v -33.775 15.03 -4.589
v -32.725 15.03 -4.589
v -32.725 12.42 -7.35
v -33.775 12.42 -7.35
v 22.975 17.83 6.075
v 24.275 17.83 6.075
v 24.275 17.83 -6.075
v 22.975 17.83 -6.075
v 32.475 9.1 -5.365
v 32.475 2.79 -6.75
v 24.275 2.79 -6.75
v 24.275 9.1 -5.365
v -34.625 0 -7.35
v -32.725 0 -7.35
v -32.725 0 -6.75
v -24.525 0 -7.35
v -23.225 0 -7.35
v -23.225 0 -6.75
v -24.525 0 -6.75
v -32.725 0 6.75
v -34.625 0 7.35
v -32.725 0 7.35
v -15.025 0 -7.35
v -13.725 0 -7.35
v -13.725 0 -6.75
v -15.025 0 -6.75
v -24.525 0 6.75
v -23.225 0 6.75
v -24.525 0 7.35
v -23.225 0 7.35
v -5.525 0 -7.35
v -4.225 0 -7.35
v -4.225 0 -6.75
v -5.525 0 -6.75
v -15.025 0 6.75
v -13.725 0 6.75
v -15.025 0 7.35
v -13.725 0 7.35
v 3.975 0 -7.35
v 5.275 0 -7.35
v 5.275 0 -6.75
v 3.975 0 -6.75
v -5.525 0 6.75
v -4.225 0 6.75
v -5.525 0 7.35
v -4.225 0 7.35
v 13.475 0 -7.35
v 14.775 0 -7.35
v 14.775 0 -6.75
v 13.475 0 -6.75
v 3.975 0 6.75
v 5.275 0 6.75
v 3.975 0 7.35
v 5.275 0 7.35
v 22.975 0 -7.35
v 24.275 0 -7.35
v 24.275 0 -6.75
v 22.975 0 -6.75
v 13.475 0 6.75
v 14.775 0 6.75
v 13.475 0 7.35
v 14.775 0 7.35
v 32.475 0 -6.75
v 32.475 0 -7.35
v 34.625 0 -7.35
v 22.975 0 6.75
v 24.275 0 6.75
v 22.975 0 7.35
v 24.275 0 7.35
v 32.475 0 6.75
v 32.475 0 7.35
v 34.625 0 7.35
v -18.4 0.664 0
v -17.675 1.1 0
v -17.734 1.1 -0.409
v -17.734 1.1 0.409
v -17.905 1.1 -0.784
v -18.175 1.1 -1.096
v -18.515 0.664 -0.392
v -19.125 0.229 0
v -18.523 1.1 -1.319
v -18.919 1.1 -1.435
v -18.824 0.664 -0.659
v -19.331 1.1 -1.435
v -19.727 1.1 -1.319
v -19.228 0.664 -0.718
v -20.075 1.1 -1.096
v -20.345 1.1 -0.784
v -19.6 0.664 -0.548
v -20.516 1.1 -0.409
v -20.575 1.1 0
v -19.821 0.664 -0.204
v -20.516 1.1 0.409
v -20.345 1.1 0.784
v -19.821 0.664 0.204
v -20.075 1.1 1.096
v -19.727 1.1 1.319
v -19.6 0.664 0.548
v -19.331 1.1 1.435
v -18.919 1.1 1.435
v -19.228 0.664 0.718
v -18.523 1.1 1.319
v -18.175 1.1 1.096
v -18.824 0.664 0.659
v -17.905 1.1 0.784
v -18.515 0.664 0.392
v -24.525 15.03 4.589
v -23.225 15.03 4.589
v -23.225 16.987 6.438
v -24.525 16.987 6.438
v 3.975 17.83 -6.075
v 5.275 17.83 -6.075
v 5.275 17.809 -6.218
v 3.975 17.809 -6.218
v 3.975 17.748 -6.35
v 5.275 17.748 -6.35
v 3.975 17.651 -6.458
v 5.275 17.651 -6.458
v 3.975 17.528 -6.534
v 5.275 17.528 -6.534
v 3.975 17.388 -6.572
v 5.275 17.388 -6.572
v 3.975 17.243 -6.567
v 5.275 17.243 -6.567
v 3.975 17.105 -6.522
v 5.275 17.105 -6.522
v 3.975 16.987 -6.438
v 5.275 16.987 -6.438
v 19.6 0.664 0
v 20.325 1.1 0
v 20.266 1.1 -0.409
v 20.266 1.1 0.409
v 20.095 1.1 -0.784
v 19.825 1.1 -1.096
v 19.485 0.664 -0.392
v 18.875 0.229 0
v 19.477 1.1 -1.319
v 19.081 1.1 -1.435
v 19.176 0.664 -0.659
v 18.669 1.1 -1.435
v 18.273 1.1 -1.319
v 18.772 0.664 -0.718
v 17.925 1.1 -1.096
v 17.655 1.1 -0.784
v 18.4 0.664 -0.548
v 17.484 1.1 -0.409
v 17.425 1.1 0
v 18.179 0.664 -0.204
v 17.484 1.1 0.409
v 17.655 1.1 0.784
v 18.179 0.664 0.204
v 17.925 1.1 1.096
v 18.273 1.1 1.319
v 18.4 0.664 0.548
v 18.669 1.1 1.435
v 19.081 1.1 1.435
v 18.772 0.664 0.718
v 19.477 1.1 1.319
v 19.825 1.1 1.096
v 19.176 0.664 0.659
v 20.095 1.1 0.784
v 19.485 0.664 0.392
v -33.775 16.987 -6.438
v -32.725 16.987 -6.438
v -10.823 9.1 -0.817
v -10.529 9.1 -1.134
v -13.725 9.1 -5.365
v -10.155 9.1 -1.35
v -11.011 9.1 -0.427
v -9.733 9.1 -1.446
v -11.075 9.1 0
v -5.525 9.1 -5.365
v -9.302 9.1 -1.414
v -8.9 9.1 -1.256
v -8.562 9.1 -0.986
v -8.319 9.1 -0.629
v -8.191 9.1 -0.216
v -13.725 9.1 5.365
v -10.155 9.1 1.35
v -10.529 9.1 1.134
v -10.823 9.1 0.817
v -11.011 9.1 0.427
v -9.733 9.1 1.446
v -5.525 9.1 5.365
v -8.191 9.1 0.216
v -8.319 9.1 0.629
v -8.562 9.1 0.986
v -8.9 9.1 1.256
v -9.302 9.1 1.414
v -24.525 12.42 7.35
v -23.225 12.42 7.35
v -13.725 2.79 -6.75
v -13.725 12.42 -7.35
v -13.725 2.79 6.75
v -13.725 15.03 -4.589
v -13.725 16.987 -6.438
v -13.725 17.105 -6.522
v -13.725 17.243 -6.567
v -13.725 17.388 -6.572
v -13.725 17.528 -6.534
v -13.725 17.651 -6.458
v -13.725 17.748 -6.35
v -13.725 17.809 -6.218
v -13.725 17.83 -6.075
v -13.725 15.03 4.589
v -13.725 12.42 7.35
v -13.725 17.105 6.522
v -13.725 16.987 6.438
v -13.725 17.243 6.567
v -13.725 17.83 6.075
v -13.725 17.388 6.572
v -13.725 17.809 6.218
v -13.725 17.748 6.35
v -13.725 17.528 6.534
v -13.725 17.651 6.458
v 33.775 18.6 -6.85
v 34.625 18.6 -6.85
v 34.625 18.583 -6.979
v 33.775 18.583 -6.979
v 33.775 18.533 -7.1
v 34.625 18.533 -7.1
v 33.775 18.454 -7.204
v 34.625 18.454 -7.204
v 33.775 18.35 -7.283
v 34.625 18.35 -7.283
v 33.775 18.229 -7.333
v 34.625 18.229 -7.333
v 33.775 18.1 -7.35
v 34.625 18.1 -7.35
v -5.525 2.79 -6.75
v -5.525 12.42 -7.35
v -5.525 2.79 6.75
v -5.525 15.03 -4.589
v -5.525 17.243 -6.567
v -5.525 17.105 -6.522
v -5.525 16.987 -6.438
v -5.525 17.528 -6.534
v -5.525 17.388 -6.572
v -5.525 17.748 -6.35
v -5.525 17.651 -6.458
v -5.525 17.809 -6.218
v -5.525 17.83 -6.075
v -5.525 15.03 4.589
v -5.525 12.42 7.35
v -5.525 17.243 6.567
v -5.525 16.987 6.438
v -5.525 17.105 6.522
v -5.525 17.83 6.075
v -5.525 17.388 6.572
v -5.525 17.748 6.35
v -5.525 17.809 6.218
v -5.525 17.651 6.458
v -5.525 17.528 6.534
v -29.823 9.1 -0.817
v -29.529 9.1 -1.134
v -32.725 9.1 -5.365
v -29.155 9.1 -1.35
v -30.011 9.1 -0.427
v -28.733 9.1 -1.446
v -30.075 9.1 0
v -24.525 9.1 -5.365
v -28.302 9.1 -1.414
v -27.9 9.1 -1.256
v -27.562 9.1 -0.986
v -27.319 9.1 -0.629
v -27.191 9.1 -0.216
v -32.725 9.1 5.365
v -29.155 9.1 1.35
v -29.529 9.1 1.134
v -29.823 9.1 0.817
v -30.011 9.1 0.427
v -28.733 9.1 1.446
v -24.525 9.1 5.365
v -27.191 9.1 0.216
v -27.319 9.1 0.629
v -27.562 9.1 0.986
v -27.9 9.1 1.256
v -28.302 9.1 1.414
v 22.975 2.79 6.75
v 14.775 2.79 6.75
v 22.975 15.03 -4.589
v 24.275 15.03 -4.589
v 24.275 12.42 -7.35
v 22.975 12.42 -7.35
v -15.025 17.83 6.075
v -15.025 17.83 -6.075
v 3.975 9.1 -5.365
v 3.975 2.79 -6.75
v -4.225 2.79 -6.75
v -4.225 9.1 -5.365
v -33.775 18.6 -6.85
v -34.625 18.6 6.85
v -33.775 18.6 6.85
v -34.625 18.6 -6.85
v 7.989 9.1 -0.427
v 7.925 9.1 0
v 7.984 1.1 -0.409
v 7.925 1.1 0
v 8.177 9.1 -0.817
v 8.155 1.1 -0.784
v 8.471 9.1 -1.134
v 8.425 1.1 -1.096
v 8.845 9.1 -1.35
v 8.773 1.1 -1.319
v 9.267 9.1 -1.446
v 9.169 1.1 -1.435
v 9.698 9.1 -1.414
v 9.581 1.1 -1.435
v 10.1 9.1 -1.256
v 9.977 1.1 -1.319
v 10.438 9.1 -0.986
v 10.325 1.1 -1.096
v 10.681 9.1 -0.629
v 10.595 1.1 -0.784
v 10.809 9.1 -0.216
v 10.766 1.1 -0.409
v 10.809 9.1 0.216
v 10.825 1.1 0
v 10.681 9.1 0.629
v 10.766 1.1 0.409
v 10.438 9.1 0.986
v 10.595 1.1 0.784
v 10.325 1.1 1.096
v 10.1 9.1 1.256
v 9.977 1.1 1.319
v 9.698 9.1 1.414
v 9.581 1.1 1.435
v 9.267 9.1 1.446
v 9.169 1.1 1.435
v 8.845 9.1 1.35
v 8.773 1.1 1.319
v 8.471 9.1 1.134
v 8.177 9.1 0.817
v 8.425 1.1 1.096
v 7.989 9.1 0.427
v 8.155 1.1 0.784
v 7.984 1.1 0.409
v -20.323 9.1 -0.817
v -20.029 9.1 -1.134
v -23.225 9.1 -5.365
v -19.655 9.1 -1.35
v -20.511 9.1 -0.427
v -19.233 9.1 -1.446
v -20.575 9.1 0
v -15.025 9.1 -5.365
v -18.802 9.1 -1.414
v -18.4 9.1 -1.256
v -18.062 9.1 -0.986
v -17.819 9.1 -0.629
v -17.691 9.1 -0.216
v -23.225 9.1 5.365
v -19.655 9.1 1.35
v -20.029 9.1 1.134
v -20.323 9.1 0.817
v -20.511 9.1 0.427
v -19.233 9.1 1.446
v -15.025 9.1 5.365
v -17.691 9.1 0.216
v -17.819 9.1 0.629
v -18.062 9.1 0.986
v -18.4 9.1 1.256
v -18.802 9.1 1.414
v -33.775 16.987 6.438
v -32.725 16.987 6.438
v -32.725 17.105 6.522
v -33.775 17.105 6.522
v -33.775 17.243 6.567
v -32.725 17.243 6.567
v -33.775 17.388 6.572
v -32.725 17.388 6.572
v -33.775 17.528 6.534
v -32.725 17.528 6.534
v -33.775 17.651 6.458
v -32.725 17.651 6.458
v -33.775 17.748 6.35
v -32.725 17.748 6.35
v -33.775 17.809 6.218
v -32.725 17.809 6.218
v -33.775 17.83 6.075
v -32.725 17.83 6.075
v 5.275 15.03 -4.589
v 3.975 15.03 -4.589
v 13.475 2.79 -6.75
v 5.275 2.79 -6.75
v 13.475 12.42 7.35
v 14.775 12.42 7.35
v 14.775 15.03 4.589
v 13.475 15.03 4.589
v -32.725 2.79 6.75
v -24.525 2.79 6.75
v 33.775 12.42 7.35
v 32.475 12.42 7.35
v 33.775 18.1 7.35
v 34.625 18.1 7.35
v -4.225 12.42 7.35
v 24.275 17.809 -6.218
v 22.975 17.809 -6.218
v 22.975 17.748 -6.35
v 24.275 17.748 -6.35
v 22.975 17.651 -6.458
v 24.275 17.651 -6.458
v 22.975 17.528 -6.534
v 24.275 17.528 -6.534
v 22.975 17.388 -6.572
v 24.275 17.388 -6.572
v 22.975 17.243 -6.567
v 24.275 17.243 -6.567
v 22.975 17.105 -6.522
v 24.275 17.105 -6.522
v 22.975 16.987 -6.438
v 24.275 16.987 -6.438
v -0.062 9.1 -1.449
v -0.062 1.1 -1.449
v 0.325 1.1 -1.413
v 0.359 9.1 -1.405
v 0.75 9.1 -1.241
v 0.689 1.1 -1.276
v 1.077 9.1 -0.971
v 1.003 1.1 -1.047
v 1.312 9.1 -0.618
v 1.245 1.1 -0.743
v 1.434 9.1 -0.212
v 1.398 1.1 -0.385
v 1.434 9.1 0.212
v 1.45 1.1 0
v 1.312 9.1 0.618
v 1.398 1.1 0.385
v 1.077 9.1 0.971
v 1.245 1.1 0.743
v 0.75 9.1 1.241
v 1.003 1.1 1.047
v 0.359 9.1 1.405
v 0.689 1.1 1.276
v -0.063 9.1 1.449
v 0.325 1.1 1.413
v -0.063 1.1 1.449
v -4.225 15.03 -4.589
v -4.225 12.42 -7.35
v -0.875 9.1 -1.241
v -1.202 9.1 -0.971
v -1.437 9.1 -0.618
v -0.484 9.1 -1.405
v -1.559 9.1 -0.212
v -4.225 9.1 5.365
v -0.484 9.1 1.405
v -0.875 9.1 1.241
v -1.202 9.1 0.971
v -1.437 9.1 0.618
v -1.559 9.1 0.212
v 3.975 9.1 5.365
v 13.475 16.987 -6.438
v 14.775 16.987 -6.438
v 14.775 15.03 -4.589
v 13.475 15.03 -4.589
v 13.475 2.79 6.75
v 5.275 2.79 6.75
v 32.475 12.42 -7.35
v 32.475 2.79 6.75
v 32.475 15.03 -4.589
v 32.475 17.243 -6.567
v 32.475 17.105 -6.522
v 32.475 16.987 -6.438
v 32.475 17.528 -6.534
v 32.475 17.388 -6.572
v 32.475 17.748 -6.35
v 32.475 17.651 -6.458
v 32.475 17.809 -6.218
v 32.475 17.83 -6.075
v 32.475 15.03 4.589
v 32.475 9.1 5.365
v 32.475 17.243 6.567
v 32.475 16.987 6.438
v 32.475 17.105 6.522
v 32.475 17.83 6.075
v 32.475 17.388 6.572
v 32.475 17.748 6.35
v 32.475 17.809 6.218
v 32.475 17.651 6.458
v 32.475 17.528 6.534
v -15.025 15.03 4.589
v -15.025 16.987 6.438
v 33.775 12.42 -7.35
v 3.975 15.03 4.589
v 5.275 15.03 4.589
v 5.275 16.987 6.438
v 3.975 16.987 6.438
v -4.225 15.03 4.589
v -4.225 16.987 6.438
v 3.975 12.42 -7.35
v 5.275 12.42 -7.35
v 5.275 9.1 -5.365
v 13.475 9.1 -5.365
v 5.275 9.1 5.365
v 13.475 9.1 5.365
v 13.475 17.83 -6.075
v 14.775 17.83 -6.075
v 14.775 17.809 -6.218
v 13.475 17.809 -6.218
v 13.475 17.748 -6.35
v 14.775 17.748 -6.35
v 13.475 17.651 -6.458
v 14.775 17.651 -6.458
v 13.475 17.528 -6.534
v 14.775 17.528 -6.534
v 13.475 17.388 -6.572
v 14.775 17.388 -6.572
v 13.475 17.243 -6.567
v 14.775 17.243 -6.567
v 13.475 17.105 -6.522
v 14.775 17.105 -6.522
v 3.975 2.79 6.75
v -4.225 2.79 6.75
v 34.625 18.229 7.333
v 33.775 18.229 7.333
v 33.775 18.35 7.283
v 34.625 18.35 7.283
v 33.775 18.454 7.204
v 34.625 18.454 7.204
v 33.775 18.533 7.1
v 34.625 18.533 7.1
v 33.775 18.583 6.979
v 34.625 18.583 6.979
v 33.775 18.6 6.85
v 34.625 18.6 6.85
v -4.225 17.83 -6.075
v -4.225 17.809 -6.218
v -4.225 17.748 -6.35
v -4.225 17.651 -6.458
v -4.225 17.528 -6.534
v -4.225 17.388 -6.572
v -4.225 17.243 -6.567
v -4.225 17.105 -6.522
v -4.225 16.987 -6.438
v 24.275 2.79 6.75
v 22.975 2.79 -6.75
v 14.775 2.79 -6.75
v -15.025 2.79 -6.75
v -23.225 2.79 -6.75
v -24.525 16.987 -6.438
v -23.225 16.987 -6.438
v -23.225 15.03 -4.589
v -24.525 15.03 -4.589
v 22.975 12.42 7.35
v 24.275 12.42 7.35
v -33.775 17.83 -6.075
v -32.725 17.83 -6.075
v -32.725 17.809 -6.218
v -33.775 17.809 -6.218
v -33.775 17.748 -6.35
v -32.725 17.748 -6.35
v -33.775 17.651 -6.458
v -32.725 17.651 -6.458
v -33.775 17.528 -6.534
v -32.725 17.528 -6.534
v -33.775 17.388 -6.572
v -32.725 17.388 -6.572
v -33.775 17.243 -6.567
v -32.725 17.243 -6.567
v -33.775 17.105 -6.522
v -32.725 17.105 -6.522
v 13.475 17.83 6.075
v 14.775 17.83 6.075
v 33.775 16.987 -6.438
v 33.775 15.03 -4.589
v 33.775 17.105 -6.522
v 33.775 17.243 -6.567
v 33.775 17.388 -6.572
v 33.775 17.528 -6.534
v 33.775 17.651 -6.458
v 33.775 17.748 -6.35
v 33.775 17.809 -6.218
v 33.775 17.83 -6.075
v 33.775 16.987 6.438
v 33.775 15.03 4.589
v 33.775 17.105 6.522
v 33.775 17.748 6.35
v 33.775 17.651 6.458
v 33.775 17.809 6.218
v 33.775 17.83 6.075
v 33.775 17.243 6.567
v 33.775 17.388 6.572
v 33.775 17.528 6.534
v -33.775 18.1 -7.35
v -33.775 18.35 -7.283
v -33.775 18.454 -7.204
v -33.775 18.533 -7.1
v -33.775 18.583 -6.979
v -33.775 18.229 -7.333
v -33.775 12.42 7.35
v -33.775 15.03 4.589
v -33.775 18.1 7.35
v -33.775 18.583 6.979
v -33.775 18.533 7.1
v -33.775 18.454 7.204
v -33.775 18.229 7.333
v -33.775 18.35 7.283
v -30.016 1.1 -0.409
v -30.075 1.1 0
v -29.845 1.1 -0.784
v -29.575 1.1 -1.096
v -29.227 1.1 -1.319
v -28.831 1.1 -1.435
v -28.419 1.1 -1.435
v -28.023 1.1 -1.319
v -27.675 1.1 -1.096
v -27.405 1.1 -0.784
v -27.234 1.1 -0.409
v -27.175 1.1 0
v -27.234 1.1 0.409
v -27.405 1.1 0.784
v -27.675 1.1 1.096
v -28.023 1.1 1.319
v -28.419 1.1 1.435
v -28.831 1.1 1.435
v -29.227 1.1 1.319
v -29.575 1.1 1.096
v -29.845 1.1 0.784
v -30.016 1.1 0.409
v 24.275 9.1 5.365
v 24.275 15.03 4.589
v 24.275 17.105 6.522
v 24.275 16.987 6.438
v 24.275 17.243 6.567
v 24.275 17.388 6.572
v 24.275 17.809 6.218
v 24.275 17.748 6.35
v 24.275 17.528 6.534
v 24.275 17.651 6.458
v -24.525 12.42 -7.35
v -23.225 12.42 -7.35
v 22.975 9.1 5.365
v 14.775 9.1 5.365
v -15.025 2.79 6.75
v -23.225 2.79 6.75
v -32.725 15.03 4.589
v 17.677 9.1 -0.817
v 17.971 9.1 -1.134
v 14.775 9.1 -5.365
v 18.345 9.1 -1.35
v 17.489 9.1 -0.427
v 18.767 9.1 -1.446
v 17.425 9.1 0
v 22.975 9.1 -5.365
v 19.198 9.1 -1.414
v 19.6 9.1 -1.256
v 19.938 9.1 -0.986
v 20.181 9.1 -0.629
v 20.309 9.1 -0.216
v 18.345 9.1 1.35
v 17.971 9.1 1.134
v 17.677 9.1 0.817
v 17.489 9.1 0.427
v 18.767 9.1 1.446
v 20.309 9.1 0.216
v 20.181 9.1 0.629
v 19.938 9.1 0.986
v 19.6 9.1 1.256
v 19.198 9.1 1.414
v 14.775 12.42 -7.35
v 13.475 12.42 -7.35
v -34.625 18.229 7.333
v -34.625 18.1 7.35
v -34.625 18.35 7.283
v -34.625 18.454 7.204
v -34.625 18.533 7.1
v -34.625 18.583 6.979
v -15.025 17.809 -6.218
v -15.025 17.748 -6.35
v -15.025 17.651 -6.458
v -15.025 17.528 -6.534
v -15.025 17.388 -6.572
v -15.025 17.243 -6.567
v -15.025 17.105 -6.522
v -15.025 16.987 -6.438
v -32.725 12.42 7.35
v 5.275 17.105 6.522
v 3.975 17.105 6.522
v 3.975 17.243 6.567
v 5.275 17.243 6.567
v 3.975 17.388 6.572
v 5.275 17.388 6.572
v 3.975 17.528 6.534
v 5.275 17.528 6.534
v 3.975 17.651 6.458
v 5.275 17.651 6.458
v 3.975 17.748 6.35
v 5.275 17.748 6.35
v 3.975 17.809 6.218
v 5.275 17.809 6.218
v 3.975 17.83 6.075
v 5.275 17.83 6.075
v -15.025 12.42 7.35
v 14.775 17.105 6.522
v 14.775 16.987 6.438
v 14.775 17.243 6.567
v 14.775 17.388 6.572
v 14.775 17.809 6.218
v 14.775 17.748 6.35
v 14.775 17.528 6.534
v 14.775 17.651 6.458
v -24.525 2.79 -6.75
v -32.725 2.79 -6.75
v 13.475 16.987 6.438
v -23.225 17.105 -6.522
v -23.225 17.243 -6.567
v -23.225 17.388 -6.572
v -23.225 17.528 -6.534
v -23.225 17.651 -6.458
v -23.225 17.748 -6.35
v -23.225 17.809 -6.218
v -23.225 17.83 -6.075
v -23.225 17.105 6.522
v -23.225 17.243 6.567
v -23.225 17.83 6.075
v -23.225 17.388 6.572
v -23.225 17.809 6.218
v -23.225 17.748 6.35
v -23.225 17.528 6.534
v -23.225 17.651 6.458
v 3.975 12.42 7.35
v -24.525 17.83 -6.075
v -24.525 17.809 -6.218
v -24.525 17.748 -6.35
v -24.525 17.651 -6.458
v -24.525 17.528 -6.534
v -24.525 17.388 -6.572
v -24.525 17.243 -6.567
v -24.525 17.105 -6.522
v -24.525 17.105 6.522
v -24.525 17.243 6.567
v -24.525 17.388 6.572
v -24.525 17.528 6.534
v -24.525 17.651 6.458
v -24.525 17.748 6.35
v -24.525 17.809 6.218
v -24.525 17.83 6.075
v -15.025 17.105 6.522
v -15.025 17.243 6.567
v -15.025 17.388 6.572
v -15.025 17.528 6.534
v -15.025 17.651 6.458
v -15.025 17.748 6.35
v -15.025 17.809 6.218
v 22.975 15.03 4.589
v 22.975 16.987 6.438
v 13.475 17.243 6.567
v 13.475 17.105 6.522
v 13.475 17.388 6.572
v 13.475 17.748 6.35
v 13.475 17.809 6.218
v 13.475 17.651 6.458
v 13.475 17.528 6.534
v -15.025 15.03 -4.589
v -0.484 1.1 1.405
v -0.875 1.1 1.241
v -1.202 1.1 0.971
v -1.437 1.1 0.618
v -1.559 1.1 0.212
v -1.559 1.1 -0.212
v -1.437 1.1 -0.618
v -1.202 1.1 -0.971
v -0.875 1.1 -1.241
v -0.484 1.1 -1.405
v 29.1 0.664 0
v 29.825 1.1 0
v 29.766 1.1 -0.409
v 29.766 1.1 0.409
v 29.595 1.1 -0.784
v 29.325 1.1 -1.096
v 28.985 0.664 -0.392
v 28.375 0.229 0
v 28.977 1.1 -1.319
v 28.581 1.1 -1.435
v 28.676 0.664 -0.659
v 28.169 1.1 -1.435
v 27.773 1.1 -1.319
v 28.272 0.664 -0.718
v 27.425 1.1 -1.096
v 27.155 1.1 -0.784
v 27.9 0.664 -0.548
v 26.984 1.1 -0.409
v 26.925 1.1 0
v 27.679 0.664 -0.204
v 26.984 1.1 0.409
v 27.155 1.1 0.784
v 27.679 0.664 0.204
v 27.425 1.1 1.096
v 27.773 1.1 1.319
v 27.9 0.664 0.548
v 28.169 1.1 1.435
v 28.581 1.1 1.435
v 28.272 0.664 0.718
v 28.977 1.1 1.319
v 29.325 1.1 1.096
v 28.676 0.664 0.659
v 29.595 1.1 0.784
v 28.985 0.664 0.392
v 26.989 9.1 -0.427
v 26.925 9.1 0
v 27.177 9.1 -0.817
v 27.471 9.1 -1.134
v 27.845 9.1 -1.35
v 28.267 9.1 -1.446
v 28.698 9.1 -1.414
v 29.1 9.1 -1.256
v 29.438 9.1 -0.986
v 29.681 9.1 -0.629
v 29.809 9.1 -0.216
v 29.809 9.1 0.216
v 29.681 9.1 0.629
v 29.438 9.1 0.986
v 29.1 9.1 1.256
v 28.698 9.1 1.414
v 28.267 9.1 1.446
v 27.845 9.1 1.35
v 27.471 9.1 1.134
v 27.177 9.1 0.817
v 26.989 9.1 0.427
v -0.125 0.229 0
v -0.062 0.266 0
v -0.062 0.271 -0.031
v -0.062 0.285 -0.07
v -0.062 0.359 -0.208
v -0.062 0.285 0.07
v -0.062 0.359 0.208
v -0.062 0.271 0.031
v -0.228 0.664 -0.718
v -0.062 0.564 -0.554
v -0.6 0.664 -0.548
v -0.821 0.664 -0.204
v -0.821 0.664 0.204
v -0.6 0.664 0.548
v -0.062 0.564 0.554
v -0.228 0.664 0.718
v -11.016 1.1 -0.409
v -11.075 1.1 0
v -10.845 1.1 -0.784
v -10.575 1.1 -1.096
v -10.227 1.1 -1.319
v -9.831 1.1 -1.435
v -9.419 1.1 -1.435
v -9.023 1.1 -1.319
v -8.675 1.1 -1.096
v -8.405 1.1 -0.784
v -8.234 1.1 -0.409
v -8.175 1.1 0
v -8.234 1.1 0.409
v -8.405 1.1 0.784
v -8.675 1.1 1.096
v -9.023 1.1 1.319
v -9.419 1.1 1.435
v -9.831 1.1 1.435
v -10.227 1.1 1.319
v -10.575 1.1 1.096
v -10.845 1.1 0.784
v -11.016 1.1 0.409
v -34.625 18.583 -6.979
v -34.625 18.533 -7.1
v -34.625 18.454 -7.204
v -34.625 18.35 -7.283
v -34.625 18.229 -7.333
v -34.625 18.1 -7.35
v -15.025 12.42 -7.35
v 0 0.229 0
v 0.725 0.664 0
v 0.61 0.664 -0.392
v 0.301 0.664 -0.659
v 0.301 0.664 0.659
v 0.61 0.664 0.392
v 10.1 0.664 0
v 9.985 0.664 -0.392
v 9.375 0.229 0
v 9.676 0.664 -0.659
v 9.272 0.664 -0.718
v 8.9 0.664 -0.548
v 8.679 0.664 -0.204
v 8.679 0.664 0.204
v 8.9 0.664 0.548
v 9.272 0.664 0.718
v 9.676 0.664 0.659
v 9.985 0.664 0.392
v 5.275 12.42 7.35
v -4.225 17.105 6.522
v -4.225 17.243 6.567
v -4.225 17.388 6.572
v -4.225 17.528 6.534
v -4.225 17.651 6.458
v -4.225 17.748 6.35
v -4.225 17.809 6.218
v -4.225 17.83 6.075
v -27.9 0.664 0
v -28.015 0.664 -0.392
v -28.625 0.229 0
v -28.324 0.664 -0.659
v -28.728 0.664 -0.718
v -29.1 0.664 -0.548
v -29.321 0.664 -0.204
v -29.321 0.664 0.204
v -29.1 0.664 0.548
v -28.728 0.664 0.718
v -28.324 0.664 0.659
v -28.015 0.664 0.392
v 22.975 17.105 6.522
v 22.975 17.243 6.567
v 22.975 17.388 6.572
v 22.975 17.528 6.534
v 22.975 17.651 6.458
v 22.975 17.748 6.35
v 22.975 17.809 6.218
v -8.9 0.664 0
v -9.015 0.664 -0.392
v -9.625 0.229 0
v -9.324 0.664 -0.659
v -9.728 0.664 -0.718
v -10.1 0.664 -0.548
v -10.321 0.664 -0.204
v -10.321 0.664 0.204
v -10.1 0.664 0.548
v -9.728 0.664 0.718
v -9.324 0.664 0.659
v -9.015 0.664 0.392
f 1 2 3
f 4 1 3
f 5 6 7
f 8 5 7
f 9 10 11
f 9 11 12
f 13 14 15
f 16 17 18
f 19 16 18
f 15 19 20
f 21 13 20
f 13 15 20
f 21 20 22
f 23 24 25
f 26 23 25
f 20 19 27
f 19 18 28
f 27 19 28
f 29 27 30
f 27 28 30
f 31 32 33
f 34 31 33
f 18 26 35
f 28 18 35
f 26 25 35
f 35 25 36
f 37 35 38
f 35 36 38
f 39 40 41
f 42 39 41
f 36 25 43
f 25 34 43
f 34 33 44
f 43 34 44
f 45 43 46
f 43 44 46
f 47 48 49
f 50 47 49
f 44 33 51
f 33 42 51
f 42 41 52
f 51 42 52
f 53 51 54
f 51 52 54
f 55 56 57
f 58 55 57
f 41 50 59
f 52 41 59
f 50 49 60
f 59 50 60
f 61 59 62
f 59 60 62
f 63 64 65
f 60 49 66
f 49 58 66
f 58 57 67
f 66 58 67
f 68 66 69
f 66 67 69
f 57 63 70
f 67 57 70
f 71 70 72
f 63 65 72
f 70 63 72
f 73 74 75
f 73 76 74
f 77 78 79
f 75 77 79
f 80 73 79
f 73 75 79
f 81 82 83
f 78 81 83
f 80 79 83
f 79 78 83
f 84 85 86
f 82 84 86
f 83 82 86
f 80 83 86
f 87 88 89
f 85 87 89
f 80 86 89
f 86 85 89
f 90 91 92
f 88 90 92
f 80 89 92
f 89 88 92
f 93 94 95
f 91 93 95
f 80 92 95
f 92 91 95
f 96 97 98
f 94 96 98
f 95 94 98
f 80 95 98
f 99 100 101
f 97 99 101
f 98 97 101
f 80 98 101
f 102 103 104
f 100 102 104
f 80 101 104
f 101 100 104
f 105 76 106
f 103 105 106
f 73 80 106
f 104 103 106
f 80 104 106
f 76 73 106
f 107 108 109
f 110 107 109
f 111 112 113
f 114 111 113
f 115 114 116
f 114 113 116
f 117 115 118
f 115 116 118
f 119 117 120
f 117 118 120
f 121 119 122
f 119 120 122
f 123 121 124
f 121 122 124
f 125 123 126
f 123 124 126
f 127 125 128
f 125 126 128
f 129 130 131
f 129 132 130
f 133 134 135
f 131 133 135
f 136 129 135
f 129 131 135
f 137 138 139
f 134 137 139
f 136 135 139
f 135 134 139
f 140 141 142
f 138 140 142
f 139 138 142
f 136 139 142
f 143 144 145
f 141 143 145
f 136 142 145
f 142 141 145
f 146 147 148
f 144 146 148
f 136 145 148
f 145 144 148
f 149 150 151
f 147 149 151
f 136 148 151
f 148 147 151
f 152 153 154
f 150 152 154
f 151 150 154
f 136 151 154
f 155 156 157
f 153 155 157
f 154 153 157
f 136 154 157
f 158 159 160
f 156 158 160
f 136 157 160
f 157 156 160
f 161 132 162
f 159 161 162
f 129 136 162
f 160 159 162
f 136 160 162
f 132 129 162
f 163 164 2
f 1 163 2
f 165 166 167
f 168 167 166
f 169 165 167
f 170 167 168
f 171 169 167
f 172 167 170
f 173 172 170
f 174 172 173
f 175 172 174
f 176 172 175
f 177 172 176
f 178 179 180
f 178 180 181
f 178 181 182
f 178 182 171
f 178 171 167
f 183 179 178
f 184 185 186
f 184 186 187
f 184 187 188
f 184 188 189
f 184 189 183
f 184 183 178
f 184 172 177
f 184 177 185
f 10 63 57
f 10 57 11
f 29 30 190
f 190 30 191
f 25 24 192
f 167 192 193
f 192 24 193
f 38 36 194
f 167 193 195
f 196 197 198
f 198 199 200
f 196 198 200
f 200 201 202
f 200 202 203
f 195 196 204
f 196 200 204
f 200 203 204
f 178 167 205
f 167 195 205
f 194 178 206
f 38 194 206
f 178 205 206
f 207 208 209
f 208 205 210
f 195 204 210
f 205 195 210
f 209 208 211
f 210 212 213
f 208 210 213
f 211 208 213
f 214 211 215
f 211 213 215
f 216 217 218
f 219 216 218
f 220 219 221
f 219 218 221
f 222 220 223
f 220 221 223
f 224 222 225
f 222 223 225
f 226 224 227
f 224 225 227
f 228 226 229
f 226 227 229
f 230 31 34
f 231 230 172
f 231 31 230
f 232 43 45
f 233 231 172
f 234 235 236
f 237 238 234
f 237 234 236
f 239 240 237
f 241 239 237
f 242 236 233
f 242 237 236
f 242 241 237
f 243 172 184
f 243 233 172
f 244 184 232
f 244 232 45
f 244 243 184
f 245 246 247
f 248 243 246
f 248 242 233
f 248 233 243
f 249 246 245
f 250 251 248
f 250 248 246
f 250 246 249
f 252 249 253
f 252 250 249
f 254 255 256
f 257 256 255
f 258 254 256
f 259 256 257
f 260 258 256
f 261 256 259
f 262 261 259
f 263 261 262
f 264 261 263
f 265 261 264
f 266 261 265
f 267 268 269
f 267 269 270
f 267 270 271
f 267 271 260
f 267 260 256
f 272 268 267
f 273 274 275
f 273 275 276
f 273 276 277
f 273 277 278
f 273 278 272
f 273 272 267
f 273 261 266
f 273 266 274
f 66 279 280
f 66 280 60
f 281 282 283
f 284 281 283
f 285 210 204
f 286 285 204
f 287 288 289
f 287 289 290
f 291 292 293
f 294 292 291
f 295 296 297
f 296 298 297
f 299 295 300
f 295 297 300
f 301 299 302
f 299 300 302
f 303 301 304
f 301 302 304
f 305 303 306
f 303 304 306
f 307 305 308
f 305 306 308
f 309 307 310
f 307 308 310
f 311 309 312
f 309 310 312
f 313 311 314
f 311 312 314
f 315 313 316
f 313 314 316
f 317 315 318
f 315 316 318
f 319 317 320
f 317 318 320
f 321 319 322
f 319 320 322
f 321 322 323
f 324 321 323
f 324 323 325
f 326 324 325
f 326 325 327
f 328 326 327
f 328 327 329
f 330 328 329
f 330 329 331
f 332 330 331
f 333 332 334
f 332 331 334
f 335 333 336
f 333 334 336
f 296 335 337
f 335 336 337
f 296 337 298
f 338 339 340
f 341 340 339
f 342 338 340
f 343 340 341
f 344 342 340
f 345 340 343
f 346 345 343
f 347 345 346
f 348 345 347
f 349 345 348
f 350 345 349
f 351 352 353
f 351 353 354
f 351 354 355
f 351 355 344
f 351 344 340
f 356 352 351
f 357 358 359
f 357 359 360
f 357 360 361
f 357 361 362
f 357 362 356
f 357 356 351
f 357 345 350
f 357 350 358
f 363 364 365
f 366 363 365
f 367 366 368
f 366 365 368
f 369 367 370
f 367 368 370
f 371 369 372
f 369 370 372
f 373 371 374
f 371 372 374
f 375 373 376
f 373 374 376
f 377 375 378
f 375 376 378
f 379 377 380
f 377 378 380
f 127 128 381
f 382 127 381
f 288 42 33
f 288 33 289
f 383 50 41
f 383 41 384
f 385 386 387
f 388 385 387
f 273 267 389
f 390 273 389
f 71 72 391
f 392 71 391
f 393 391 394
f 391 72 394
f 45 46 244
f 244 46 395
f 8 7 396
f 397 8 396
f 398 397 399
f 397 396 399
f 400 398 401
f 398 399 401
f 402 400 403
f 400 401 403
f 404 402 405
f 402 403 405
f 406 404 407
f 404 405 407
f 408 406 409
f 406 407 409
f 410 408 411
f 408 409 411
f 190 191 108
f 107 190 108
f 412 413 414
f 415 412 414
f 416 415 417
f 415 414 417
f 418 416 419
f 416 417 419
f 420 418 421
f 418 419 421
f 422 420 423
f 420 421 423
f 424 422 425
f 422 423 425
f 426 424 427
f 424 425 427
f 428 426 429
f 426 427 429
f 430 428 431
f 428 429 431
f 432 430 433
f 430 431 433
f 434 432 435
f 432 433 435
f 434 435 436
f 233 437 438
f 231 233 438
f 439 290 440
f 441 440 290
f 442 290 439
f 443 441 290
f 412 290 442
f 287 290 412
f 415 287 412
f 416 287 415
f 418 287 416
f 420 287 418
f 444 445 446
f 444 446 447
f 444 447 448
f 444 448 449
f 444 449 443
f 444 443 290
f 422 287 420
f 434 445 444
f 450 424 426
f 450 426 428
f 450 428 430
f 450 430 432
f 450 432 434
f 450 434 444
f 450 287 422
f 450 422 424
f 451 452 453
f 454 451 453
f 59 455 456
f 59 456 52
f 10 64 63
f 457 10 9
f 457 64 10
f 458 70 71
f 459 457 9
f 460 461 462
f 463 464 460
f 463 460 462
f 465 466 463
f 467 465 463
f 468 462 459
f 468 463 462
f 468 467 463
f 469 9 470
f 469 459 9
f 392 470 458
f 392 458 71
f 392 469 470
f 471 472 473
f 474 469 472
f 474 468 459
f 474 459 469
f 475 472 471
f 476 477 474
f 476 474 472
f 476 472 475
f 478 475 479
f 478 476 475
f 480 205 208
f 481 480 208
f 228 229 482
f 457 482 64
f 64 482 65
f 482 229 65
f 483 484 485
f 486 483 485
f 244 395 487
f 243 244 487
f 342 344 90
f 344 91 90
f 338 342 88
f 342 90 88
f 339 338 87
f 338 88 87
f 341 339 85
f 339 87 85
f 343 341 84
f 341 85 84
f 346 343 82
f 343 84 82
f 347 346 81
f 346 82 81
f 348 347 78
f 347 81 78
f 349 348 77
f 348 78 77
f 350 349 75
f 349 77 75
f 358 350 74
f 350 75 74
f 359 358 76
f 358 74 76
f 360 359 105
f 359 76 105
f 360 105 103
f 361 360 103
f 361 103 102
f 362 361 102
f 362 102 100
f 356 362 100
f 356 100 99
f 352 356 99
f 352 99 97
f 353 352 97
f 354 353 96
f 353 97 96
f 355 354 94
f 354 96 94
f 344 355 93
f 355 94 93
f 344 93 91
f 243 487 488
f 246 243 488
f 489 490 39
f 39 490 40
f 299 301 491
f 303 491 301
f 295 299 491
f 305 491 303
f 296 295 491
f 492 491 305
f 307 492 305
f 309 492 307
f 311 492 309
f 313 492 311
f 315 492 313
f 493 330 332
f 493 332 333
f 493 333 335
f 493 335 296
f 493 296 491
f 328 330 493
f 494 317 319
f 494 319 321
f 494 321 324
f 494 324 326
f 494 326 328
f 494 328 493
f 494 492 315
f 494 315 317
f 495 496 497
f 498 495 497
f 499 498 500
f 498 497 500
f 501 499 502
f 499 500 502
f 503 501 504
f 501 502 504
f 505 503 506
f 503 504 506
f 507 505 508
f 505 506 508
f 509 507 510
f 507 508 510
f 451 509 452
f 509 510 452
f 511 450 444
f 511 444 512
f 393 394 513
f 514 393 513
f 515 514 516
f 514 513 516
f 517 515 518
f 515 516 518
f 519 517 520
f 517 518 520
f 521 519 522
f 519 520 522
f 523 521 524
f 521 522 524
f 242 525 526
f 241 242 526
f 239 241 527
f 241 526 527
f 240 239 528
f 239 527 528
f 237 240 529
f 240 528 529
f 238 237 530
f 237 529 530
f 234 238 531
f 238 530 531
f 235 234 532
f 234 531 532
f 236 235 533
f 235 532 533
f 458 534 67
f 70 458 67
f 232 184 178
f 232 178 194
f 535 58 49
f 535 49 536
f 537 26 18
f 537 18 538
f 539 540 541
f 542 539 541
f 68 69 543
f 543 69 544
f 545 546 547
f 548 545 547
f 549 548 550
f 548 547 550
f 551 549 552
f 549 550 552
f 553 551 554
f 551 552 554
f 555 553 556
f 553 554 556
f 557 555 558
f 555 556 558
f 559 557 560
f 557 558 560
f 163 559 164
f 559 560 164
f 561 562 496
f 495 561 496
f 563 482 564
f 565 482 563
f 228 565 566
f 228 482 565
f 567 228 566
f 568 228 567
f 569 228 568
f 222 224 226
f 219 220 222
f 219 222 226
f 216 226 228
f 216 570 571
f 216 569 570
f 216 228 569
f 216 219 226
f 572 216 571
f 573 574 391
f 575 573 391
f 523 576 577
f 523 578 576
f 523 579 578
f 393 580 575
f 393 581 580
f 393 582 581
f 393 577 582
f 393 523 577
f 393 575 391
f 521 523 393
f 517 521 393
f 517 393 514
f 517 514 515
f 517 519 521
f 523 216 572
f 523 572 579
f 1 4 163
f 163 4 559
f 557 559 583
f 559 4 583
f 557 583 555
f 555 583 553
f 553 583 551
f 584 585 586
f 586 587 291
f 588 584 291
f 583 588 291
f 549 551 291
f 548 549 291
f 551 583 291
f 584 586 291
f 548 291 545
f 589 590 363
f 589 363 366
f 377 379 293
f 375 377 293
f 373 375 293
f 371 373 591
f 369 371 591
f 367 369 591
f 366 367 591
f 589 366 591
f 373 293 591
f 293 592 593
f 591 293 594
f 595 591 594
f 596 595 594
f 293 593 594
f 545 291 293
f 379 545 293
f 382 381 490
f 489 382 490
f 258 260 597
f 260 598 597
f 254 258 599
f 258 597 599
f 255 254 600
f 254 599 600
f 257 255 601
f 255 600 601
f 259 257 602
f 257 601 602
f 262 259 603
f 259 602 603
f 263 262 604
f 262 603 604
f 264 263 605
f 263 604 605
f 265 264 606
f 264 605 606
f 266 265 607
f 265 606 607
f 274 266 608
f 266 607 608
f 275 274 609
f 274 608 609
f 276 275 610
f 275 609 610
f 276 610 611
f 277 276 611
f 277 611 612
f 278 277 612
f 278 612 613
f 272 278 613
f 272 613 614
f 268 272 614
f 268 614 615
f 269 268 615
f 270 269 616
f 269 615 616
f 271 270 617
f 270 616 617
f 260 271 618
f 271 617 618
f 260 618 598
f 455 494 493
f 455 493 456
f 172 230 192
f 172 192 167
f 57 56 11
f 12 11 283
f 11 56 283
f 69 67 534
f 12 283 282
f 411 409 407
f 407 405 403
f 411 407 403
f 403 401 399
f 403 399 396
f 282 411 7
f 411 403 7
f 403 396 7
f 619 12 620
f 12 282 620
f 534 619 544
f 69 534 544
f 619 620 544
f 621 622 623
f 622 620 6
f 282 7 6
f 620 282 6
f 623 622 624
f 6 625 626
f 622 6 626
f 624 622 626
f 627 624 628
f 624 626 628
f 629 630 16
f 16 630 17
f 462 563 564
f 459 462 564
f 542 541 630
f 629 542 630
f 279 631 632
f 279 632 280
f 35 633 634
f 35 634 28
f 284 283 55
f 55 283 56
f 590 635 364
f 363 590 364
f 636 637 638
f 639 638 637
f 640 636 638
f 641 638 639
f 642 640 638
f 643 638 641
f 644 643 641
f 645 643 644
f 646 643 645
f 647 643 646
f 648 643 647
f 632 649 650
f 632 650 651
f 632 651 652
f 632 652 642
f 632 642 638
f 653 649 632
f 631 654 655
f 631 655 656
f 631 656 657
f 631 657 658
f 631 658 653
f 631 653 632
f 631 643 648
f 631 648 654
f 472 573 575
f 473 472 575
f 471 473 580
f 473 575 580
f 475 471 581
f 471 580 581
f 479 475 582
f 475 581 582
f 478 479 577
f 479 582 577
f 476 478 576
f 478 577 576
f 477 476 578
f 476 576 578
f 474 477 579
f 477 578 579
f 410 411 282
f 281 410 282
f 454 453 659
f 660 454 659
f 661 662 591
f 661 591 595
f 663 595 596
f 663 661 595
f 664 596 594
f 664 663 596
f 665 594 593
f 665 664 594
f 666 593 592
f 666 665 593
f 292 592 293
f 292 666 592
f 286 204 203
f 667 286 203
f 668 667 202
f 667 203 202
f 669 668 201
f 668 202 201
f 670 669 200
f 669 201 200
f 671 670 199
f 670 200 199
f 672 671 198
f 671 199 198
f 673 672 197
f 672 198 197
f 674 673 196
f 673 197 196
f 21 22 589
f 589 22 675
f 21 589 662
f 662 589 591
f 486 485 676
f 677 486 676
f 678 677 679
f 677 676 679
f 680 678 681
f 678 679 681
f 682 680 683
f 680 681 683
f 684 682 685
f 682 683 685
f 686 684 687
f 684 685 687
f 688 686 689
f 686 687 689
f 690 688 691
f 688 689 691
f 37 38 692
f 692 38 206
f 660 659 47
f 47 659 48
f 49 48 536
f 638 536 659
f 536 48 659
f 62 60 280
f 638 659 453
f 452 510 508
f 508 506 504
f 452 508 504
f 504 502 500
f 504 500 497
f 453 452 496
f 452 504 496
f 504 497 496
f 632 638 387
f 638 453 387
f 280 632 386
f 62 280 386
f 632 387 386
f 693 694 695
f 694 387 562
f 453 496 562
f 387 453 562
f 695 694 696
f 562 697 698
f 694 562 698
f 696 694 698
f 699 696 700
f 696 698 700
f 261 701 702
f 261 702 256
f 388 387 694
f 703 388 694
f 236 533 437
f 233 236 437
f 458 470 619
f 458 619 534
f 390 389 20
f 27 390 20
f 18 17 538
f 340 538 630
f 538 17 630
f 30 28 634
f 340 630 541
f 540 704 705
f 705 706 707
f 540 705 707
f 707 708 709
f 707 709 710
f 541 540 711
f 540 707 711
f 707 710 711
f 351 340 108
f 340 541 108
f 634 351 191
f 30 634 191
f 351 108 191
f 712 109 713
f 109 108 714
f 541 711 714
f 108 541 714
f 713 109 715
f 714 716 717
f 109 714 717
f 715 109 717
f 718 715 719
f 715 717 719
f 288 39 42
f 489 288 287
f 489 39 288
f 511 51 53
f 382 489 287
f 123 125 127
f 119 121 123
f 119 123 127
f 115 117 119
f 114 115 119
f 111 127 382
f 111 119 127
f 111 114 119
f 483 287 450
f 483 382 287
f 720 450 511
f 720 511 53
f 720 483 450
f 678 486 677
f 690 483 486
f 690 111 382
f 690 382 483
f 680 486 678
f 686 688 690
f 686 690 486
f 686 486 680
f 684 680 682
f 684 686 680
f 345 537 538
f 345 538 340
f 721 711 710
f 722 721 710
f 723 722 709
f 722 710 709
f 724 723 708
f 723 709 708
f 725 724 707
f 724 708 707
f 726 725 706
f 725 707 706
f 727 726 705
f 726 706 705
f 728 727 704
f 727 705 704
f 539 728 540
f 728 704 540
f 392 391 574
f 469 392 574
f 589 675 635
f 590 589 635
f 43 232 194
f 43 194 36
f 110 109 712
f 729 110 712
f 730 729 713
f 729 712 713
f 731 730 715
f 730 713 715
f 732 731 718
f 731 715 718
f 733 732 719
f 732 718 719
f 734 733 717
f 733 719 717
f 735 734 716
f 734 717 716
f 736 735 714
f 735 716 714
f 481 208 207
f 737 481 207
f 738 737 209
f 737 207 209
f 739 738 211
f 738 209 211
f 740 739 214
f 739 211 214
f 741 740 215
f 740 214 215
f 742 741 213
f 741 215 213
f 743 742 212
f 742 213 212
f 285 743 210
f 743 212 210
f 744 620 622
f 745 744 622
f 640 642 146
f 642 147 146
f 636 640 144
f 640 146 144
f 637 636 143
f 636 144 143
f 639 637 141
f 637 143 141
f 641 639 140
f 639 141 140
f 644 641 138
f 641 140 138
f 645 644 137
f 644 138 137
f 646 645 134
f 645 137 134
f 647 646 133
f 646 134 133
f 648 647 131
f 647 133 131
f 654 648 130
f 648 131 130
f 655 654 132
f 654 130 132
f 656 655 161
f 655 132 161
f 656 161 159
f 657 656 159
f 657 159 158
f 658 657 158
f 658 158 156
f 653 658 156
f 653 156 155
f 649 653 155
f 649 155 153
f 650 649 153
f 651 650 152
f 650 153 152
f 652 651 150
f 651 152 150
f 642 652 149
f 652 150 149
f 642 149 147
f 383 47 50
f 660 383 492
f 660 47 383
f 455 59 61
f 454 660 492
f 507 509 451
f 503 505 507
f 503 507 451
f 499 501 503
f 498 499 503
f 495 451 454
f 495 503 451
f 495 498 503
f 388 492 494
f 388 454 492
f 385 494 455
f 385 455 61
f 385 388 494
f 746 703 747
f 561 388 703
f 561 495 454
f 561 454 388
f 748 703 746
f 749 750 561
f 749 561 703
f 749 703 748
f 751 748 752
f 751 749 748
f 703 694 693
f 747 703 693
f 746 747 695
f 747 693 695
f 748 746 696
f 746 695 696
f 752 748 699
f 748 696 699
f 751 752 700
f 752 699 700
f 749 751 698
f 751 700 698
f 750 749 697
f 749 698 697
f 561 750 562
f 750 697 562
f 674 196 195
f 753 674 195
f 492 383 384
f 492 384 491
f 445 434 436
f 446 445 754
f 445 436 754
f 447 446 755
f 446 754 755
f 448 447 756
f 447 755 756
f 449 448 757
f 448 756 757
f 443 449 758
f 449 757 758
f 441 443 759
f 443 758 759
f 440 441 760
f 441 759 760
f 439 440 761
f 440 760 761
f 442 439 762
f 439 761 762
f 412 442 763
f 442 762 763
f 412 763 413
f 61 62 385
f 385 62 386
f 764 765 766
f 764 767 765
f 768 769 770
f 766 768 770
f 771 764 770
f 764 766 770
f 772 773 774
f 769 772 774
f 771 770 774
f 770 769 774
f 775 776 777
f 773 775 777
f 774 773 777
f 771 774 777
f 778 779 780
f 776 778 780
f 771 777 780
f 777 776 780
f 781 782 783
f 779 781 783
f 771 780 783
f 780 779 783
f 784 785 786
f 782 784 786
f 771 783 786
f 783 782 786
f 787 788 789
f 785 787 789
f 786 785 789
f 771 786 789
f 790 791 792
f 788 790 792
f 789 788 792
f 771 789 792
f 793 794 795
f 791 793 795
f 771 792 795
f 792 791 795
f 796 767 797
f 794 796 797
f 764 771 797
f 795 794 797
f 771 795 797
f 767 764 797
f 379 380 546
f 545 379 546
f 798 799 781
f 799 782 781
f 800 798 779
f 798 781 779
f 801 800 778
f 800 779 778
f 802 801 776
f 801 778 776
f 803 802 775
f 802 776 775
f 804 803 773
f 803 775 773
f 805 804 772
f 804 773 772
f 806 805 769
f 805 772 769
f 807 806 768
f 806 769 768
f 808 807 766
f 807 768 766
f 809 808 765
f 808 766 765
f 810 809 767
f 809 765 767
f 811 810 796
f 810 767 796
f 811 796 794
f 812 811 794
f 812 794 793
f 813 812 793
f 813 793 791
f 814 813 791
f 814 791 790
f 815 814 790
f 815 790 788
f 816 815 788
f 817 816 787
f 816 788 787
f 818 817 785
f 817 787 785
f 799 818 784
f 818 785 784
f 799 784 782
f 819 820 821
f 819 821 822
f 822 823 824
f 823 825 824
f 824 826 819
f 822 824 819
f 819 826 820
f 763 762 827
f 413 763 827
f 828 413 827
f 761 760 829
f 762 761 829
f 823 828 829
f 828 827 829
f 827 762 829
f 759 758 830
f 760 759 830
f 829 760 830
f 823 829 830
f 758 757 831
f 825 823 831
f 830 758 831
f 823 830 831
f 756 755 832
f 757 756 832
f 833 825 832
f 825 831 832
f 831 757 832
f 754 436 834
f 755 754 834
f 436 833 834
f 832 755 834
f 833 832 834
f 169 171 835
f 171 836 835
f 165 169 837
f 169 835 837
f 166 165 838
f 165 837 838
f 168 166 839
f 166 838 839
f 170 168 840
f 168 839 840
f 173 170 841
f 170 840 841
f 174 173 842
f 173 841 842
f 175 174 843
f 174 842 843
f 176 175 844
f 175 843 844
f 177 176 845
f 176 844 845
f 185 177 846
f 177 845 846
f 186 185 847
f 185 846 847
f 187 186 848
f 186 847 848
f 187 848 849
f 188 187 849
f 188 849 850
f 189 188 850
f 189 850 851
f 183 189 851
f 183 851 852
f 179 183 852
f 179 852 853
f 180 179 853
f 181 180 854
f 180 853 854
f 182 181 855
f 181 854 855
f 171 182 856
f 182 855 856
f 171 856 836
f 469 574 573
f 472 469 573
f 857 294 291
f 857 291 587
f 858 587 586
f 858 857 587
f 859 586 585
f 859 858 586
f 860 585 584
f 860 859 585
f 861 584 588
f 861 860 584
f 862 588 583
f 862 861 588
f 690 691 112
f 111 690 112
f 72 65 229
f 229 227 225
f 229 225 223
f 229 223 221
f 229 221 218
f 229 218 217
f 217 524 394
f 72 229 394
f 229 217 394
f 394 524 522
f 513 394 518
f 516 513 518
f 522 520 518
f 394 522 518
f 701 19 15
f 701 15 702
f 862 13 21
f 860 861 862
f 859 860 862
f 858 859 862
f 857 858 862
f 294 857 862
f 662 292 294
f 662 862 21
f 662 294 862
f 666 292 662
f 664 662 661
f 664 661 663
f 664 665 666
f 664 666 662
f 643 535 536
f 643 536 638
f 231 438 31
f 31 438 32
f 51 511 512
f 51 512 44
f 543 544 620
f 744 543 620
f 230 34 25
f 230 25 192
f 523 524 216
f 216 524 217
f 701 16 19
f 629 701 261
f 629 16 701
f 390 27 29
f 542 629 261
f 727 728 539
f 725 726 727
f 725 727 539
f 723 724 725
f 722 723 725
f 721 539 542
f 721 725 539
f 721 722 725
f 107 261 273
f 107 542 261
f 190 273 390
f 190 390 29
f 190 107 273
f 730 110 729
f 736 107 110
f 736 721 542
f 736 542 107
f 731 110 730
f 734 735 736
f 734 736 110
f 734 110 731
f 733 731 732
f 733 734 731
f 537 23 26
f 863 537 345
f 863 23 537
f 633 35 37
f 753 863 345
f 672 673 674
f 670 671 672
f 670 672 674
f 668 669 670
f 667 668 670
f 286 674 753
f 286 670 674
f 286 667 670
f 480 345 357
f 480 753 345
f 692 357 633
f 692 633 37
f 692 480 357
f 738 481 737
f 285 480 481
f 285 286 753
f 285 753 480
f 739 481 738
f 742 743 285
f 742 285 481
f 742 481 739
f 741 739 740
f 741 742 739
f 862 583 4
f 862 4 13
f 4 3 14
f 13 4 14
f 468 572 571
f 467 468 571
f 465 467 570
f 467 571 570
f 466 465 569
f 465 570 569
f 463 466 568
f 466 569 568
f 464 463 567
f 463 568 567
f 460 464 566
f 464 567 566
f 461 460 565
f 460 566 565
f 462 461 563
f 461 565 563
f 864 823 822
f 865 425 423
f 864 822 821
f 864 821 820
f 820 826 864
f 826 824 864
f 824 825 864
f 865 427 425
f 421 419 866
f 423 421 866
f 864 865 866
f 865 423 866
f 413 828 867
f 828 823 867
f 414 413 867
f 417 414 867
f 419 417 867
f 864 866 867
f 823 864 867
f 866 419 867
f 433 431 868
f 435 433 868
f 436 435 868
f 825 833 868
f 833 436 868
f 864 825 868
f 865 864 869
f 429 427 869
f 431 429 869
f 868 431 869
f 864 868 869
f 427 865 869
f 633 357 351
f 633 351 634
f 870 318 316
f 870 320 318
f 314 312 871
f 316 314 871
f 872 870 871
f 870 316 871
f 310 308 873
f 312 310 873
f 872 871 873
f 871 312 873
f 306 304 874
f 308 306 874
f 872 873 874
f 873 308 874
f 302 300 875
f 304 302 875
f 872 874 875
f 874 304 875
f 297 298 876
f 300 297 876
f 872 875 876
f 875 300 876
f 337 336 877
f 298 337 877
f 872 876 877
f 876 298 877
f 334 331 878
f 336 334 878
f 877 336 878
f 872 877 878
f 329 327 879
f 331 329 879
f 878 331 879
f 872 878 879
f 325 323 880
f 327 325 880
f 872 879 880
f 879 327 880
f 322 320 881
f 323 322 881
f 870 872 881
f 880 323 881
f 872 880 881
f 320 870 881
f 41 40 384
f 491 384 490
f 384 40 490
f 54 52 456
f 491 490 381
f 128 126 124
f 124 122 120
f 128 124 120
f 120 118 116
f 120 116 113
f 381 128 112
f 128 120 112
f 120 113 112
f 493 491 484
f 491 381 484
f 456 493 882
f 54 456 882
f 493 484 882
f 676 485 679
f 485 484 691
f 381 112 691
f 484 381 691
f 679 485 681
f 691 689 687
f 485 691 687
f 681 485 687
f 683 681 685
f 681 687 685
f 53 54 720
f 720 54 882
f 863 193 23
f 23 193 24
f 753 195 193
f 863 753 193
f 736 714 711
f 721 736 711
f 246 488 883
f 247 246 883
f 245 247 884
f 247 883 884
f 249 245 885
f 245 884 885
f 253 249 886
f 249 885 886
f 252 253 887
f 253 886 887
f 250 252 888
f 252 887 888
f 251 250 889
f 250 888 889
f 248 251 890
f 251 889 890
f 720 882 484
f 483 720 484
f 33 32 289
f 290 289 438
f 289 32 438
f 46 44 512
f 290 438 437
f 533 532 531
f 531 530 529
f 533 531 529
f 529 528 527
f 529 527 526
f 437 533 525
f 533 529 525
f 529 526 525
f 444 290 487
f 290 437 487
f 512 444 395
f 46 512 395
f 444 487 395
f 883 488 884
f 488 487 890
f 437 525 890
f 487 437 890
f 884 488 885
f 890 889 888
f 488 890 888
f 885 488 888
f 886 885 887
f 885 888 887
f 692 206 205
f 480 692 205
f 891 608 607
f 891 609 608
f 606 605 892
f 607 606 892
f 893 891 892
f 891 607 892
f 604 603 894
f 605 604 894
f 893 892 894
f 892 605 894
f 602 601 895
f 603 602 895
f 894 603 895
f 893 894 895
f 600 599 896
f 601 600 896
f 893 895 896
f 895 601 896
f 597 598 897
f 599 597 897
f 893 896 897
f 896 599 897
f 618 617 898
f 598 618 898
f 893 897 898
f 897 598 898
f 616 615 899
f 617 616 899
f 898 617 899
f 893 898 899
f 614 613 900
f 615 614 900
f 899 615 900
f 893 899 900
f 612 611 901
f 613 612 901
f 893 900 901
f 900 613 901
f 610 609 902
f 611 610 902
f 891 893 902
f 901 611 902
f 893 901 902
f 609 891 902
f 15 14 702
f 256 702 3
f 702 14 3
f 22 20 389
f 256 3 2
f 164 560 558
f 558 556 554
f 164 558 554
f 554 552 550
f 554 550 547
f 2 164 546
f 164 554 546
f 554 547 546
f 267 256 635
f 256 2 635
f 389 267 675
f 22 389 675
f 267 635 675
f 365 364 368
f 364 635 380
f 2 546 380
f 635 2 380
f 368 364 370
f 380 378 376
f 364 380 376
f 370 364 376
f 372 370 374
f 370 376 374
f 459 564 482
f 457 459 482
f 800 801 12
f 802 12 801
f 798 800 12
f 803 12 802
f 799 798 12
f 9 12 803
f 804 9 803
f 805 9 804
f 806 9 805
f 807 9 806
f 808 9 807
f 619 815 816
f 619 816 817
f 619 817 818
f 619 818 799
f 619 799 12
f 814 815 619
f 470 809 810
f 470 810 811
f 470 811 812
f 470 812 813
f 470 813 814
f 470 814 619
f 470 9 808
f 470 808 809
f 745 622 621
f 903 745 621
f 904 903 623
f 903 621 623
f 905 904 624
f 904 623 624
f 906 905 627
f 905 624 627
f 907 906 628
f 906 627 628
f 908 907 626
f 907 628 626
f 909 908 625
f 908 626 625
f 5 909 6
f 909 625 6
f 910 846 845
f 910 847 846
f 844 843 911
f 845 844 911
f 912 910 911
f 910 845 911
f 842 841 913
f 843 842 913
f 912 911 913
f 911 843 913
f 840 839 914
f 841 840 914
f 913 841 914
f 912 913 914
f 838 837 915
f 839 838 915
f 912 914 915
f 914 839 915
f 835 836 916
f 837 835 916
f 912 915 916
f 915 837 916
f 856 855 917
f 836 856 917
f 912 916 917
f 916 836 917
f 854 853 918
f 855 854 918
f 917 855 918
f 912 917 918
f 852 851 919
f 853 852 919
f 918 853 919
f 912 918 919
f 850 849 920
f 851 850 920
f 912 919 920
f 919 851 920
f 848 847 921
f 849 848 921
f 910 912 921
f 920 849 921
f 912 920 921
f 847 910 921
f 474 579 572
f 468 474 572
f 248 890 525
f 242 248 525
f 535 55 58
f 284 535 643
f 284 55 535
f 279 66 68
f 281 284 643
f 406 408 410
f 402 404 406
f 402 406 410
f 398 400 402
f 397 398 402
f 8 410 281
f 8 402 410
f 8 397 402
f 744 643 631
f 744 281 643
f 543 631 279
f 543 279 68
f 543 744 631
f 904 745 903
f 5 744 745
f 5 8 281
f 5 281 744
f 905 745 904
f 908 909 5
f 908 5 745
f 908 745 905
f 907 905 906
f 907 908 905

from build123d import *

# Parameters (mm, degrees)
BOSS_EXTRUDE1_DEPTH         = 34.625
BOSS_EXTRUDE2_DEPTH         = 0.85
BOSS_EXTRUDE3_DEPTH         = 1.3
LPATTERN1_COUNT             = 8
LPATTERN1_PITCH             = 9.5
M3_5X0_6_TAPPED_HOLE1_D     = 2.9
M3_5X0_6_TAPPED_HOLE1_DEPTH = 8
M3_5X0_6_TAPPED_HOLE1_TIP   = 0.871247898


with BuildPart() as part:
    # Sketch1 → Boss-Extrude1 (new body, symmetric)
    with BuildSketch(Plane(origin=(0, 0, 0), x_dir=(0, 0, -1), z_dir=(1, 0, 0))):
        Polygon((6.75, 0), (6.75, 2.79), (5.365, 9.1), (-5.365, 9.1), (-6.75, 2.79), (-6.75, 0), align=None)
    extrude(amount=BOSS_EXTRUDE1_DEPTH, both=True)

    # Sketch3 → Boss-Extrude2 (add)
    with BuildSketch(Plane(origin=(34.625, 0, 0), x_dir=(0, 0, -1), z_dir=(1, 0, 0))):
        with BuildLine():
            Line((-6.75, 0), (-7.35, 0))
            Line((-7.35, 0), (-7.35, 18.1))
            ThreePointArc((-7.35, 18.1), (-7.203553391, 18.453553391), (-6.85, 18.6))
            Line((-6.85, 18.6), (6.85, 18.6))
            ThreePointArc((6.85, 18.6), (7.203553391, 18.453553391), (7.35, 18.1))
            Line((7.35, 18.1), (7.35, 0))
            Line((7.35, 0), (6.75, 0))
            Line((6.75, 0), (6.75, 2.79))
            Line((6.75, 2.79), (5.365, 9.1))
            Line((5.365, 9.1), (-5.365, 9.1))
            Line((-5.365, 9.1), (-6.75, 2.79))
            Line((-6.75, 2.79), (-6.75, 0))
        make_face()
    boss_extrude2 = extrude(amount=-BOSS_EXTRUDE2_DEPTH)

    # Mirror1: Boss-Extrude2 across plane
    add(boss_extrude2.mirror(Plane(origin=(0, 0, 0), x_dir=(0, 0, 1), z_dir=(1, 0, 0))))

    # Sketch4 → Boss-Extrude3 (add)
    with BuildSketch(Plane.ZY.offset(-33.775)):
        with BuildLine():
            Line((7.35, 0), (7.35, 12.42))
            Line((7.35, 12.42), (4.588898397, 15.03))
            Line((4.588898397, 15.03), (6.438355915, 16.98652878))
            ThreePointArc((6.438355915, 16.98652878), (6.534203446, 17.527818591), (6.075, 17.83))
            Line((6.075, 17.83), (-6.075, 17.83))
            ThreePointArc((-6.075, 17.83), (-6.534203446, 17.527818591), (-6.438355915, 16.98652878))
            Line((-6.438355915, 16.98652878), (-4.588898397, 15.03))
            Line((-4.588898397, 15.03), (-7.35, 12.42))
            Line((-7.35, 12.42), (-7.35, 0))
            Line((-7.35, 0), (-6.75, 0))
            Line((-6.75, 0), (-6.75, 2.79))
            Line((-6.75, 2.79), (-5.365, 9.1))
            Line((-5.365, 9.1), (5.365, 9.1))
            Line((5.365, 9.1), (6.75, 2.79))
            Line((6.75, 2.79), (6.75, 0))
            Line((6.75, 0), (7.35, 0))
        make_face()
    boss_extrude3 = extrude(amount=BOSS_EXTRUDE3_DEPTH)

    # LPattern1: Boss-Extrude3 ×8
    with Locations(*[(-i * LPATTERN1_PITCH, 0, 0) for i in range(1, LPATTERN1_COUNT)]):
        add(boss_extrude3)

    # M3.5x0.6 Tapped Hole1
    with Locations(Plane(origin=(0, 9.1, 0), x_dir=(1, 0, 0), z_dir=(0, 1, 0))):
        with Locations((-28.625, 0), (-19.125, 0), (0, 0), (-0.125, 0), (9.375, 0), (18.875, 0), (28.375, 0), (-9.625, 0)):
            Hole(M3_5X0_6_TAPPED_HOLE1_D / 2, depth=M3_5X0_6_TAPPED_HOLE1_DEPTH)
            with Locations((0, 0, -(M3_5X0_6_TAPPED_HOLE1_DEPTH + M3_5X0_6_TAPPED_HOLE1_TIP / 2))):  # 118° drill point
                Cone(0, M3_5X0_6_TAPPED_HOLE1_D / 2, M3_5X0_6_TAPPED_HOLE1_TIP, mode=Mode.SUBTRACT)


solid = part.part
